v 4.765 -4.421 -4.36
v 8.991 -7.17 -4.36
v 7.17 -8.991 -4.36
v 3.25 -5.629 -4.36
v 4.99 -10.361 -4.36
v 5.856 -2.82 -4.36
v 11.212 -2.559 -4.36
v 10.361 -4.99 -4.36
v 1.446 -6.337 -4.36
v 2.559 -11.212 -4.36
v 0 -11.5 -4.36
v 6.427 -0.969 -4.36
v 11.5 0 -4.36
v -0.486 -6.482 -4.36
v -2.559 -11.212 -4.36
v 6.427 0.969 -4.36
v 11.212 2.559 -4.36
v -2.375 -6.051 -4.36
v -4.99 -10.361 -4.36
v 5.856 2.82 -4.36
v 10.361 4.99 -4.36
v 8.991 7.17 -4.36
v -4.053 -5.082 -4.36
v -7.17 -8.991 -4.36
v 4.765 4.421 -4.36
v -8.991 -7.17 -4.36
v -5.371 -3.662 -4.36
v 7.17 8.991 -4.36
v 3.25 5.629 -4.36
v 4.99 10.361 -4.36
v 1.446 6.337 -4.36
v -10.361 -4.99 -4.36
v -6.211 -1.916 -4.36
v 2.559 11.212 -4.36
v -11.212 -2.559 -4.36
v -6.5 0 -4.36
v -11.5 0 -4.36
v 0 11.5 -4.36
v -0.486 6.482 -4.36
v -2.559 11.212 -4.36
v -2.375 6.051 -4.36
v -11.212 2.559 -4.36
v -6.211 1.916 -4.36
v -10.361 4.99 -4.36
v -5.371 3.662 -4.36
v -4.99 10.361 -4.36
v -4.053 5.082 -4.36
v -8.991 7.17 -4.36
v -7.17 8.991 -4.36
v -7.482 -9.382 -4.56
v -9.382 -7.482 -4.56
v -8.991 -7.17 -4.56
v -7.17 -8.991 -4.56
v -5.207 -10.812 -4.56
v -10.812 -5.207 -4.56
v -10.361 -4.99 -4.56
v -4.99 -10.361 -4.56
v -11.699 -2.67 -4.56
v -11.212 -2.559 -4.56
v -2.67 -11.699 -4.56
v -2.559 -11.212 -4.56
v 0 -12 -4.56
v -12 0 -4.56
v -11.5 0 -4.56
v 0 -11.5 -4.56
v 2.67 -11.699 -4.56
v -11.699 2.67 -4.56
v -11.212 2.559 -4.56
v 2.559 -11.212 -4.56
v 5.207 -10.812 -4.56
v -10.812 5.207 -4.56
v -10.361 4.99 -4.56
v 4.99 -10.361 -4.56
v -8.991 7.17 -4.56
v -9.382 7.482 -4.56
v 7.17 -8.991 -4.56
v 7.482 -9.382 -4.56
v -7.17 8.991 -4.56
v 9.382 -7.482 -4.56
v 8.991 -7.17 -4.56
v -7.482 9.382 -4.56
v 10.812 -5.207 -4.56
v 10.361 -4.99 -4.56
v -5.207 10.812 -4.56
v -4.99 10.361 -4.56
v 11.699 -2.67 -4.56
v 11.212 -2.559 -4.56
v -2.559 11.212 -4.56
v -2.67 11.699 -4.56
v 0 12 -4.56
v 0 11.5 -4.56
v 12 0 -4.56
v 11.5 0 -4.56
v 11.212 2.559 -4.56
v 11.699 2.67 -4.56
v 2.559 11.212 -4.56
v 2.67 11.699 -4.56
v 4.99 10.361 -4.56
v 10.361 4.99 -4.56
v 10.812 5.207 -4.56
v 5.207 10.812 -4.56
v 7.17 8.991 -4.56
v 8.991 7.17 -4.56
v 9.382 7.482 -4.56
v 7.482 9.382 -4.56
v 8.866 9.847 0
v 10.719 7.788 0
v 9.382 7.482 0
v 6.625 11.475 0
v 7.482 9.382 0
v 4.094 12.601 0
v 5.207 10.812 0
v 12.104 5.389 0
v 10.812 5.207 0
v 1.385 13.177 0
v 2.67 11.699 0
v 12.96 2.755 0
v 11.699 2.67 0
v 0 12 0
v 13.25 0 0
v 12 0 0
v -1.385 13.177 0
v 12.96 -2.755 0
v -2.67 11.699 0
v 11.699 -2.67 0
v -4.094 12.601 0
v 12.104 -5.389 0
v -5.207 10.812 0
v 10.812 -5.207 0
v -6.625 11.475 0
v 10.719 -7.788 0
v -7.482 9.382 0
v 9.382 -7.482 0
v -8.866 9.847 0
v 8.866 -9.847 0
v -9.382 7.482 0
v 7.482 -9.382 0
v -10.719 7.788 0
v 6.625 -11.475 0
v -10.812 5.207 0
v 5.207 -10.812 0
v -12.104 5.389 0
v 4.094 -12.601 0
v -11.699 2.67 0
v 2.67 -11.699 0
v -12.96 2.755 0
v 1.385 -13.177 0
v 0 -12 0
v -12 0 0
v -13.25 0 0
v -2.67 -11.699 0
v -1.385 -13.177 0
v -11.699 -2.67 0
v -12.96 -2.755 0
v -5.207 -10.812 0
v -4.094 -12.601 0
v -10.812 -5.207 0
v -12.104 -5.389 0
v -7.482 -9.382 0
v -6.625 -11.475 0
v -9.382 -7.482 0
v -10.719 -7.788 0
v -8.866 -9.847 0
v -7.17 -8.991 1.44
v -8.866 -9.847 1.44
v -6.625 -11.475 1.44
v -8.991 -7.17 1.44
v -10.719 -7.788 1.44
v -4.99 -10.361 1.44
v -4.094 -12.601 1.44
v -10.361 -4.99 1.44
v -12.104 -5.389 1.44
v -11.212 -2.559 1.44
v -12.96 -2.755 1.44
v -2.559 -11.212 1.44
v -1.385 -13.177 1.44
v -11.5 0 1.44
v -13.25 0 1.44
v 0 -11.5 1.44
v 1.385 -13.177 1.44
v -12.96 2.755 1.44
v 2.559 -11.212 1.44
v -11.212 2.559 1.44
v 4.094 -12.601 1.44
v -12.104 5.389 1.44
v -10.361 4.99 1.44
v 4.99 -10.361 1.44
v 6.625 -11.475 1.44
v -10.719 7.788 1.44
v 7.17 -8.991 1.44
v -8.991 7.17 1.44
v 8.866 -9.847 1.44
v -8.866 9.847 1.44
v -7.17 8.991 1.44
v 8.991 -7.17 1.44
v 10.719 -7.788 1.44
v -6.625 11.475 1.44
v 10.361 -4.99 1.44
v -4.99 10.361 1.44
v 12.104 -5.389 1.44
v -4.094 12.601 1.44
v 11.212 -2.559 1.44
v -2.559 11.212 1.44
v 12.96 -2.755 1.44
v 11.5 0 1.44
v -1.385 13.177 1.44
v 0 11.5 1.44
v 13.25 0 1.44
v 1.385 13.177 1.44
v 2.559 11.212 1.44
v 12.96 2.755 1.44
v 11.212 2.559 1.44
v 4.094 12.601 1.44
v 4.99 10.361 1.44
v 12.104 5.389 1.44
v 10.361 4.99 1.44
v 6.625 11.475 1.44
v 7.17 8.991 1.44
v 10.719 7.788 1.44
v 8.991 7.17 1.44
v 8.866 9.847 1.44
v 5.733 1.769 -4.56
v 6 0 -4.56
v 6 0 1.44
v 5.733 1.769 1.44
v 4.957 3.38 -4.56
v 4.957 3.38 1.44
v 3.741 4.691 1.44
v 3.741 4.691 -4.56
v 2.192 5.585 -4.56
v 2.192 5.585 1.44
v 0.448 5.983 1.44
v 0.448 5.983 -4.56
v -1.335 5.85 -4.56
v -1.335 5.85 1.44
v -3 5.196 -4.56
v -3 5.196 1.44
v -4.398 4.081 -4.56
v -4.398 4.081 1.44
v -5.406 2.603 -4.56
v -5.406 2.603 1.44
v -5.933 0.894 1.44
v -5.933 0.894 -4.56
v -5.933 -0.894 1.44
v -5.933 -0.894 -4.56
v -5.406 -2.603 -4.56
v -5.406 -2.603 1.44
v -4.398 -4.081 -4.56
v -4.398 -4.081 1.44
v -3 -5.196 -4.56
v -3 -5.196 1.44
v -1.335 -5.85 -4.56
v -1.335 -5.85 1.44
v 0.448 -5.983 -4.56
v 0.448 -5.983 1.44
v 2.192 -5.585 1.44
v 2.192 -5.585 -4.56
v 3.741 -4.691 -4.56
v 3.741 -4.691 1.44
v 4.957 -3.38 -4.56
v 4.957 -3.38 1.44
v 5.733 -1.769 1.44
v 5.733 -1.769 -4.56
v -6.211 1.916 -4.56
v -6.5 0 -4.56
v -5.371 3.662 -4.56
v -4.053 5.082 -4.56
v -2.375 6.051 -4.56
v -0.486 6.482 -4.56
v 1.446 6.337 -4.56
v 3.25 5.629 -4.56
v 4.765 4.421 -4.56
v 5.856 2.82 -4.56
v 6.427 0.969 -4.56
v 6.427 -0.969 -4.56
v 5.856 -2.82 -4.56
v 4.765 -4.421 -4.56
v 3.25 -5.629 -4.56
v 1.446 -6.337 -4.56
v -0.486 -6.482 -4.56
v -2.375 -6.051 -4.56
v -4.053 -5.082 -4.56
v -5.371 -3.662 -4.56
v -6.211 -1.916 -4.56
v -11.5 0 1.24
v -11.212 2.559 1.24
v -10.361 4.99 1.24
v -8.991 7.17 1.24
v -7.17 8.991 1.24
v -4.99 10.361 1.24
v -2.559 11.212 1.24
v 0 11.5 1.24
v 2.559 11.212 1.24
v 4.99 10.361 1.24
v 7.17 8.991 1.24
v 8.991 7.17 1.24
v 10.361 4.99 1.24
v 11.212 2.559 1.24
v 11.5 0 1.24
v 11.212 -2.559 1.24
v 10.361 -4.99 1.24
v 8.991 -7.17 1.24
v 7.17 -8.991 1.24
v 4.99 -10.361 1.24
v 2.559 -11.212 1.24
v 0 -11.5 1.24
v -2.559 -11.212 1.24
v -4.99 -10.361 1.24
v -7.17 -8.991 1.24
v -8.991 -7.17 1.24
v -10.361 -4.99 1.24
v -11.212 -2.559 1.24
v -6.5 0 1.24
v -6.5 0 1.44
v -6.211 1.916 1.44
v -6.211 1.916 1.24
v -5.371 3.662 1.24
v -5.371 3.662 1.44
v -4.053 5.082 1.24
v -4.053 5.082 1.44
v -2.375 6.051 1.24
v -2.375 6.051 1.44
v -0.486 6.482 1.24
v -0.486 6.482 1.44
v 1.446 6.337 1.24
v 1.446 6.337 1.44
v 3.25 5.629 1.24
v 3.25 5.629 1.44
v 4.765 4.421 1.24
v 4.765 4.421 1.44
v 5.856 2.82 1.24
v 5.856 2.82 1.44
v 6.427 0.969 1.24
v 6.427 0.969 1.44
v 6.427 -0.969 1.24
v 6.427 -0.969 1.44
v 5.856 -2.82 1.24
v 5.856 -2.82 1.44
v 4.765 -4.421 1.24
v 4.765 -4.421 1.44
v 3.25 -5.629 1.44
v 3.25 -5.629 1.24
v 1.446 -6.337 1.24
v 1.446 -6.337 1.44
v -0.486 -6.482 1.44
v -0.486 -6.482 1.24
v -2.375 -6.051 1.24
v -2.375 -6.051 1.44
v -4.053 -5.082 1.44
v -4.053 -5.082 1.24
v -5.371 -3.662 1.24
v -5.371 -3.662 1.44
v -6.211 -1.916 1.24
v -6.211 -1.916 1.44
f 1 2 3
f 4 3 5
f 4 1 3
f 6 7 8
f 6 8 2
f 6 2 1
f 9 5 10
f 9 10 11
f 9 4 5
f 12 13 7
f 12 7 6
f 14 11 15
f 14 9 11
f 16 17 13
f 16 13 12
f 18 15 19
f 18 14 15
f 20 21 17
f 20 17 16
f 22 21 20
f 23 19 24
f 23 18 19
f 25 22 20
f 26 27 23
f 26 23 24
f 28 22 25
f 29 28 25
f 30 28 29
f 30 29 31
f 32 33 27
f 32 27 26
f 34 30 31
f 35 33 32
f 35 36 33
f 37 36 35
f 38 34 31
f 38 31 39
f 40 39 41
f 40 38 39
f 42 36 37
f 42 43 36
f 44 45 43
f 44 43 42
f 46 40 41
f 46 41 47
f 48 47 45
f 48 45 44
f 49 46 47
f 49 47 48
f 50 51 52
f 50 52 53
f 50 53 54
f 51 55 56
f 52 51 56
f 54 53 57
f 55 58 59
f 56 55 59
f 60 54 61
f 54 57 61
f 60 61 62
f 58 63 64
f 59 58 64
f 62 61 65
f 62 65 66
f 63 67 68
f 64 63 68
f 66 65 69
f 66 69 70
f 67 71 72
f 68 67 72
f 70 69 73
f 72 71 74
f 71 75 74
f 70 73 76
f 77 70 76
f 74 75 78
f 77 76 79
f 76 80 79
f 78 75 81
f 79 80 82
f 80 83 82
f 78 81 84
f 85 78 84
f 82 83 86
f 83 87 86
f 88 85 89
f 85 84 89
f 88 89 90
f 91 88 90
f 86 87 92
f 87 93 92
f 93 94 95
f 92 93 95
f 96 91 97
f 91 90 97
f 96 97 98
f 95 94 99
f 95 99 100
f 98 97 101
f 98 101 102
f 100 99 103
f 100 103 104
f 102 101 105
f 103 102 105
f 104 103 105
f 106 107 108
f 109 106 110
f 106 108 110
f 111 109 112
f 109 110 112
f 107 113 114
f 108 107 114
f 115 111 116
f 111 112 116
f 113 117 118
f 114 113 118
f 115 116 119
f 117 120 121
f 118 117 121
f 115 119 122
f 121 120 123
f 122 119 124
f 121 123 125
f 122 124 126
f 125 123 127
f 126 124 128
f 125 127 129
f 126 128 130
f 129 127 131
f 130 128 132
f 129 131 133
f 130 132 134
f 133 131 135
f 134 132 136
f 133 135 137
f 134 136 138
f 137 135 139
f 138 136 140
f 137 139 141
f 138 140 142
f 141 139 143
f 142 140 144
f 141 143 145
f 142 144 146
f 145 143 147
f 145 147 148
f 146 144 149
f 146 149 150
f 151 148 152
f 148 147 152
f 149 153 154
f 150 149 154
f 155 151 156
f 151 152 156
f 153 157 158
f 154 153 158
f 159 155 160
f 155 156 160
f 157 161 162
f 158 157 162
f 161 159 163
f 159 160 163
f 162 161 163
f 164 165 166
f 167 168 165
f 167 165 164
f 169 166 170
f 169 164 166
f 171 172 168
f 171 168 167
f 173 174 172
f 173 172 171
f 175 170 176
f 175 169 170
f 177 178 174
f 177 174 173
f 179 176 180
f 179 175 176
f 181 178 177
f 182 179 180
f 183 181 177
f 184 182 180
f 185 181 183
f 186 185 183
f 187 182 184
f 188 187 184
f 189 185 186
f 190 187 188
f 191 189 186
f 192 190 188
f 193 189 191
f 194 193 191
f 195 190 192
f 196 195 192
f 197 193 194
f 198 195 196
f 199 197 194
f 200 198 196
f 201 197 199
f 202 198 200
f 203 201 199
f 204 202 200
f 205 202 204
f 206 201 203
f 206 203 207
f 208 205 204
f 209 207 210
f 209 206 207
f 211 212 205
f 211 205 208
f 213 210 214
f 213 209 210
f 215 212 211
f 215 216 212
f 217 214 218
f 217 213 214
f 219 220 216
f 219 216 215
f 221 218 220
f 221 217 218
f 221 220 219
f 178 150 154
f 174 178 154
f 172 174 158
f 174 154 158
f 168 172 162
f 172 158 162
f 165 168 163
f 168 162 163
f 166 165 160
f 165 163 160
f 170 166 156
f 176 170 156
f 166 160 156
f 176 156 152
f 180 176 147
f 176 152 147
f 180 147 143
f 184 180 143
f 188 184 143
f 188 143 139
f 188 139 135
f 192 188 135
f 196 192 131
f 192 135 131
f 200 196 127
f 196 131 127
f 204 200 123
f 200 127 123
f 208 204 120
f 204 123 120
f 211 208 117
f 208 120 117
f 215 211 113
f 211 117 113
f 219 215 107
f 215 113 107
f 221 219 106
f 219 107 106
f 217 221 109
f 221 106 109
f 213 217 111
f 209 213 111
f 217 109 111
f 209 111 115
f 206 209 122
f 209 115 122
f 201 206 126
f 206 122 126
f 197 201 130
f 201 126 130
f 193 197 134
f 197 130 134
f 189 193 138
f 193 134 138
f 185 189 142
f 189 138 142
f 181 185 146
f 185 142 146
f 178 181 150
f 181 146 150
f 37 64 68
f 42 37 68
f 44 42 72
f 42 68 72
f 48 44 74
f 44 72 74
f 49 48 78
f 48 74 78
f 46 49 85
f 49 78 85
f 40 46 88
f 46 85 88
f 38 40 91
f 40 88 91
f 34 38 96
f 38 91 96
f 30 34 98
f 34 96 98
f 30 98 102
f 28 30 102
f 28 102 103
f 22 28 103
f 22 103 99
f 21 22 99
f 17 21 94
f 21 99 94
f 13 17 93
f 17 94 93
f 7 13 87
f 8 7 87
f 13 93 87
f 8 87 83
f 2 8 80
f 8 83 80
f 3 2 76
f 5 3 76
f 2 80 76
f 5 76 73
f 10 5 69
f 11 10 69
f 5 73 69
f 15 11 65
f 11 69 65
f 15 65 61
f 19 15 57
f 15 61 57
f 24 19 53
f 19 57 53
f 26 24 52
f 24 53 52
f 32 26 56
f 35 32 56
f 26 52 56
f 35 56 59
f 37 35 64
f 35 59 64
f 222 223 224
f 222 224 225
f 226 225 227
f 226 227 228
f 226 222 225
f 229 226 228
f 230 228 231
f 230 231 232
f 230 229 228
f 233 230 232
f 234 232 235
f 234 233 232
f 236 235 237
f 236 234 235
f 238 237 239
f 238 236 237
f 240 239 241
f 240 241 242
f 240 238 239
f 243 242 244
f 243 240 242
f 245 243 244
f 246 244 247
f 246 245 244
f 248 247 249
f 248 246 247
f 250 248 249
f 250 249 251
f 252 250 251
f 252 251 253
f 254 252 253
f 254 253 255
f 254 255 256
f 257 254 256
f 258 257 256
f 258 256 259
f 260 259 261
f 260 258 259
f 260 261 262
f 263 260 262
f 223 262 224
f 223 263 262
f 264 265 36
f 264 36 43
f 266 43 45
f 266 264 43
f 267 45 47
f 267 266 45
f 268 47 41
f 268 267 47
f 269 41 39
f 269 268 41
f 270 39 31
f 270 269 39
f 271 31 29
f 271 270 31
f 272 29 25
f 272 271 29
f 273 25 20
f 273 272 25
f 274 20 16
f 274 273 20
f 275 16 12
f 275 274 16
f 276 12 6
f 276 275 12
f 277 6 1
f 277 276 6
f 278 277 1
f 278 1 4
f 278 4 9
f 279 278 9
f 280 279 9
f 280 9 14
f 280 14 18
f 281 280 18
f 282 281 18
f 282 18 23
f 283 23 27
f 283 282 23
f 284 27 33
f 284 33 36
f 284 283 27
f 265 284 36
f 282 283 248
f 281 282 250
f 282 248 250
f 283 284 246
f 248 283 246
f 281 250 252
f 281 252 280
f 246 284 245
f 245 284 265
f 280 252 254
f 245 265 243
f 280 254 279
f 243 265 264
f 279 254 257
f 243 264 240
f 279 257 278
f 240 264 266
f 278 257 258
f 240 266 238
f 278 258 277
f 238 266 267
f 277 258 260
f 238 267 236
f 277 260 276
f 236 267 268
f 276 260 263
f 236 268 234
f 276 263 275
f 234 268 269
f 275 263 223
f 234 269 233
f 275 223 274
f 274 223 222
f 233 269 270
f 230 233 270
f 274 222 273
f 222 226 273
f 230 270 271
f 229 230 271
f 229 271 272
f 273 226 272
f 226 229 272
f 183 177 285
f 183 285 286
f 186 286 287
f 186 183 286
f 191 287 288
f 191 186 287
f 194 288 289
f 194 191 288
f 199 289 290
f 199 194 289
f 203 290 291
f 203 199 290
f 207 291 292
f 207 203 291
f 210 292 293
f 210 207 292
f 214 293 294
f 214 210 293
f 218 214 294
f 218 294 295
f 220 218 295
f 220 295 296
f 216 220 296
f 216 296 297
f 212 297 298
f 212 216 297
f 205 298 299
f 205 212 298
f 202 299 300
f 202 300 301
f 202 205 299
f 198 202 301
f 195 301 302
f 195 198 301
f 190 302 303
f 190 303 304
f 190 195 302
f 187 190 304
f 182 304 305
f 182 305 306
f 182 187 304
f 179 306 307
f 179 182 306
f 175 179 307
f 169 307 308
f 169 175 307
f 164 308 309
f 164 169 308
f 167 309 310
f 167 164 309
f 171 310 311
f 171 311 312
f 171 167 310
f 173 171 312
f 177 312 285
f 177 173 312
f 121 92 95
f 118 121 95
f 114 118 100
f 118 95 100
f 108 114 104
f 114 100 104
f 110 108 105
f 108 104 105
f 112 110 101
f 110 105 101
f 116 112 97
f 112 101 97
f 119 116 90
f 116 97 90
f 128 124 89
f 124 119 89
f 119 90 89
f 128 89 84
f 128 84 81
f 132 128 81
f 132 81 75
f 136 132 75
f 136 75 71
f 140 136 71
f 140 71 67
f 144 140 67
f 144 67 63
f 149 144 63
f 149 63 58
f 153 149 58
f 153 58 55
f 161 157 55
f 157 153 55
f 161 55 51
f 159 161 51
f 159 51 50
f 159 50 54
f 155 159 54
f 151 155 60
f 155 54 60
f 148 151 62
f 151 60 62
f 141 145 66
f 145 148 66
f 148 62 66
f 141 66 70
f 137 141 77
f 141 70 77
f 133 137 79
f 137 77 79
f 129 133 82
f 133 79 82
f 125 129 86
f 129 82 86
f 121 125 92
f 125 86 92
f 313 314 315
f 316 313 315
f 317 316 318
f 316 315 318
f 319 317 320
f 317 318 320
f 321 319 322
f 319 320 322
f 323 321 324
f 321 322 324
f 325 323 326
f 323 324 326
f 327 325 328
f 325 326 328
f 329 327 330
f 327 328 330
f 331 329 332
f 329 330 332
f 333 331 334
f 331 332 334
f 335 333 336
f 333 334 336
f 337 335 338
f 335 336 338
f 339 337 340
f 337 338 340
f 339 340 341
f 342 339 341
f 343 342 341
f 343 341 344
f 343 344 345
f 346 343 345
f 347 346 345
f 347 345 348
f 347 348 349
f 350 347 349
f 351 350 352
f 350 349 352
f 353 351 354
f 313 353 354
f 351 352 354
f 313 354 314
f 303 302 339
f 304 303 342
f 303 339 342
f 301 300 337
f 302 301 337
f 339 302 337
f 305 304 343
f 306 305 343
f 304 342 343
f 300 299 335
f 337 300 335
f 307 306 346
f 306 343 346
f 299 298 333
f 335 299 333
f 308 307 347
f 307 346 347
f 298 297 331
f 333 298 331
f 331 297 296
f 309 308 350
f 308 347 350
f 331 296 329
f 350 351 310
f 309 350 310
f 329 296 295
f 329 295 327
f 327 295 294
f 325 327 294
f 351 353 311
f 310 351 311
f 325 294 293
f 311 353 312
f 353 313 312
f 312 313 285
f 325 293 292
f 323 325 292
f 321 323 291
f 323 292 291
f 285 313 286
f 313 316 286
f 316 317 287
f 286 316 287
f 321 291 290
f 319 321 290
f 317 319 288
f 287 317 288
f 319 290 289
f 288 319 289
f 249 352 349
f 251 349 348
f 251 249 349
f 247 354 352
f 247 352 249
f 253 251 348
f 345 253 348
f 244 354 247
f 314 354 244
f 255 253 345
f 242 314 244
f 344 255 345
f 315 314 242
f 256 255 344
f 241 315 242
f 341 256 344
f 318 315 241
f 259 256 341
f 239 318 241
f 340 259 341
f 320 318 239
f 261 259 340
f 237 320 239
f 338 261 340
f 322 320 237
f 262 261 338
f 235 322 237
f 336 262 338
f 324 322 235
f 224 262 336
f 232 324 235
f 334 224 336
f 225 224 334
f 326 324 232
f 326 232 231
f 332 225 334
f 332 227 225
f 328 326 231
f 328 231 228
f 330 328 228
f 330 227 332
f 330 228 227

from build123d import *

# Parameters (mm, degrees)
SKETCH_1_R          = 13.25
SKETCH_1_R_2        = 12
EXTRUDE_1_DEPTH     = 1.44
EXTRUDE_START       = -6
SKETCH_2_R          = 12
SKETCH_2_R_2        = 6
EXTRUDE_2_DEPTH     = 6
SKETCH_3_R          = 11.5
SKETCH_3_R_2        = 6.5
CUT_EXTRUDE_1_DEPTH = 0.2


with BuildPart() as part:
    # 草图1 → 凸台-拉伸1 (new body)
    with BuildSketch(Plane.XY):
        with Locations(Location((0, 0, 0), (0, 0, 180))):
            Circle(SKETCH_1_R)
        with Locations(Location((0, 0, 0), (0, 0, 180))):
            Circle(SKETCH_1_R_2, mode=Mode.SUBTRACT)
    extrude(amount=EXTRUDE_1_DEPTH)

    # 草图2 → 凸台-拉伸2 (add)
    with BuildSketch(Plane.XY.offset(1.44).offset(EXTRUDE_START)):
        Circle(SKETCH_2_R)
        Circle(SKETCH_2_R_2, mode=Mode.SUBTRACT)
    extrude(amount=EXTRUDE_2_DEPTH)

    # 草图3 → 切除-拉伸1 (cut)
    with BuildSketch(Plane(origin=(0, 0, -4.56), x_dir=(-1, 0, 0), z_dir=(0, 0, -1))):
        Circle(SKETCH_3_R)
        Circle(SKETCH_3_R_2, mode=Mode.SUBTRACT)
    cut_extrude_1 = extrude(amount=-CUT_EXTRUDE_1_DEPTH, mode=Mode.SUBTRACT)

    # 镜向1: 切除-拉伸1 across plane
    add(cut_extrude_1.mirror(Plane(origin=(0, 0, -1.56), x_dir=(1, 0, 0), z_dir=(0, 0, -1))), mode=Mode.SUBTRACT)


solid = part.part
